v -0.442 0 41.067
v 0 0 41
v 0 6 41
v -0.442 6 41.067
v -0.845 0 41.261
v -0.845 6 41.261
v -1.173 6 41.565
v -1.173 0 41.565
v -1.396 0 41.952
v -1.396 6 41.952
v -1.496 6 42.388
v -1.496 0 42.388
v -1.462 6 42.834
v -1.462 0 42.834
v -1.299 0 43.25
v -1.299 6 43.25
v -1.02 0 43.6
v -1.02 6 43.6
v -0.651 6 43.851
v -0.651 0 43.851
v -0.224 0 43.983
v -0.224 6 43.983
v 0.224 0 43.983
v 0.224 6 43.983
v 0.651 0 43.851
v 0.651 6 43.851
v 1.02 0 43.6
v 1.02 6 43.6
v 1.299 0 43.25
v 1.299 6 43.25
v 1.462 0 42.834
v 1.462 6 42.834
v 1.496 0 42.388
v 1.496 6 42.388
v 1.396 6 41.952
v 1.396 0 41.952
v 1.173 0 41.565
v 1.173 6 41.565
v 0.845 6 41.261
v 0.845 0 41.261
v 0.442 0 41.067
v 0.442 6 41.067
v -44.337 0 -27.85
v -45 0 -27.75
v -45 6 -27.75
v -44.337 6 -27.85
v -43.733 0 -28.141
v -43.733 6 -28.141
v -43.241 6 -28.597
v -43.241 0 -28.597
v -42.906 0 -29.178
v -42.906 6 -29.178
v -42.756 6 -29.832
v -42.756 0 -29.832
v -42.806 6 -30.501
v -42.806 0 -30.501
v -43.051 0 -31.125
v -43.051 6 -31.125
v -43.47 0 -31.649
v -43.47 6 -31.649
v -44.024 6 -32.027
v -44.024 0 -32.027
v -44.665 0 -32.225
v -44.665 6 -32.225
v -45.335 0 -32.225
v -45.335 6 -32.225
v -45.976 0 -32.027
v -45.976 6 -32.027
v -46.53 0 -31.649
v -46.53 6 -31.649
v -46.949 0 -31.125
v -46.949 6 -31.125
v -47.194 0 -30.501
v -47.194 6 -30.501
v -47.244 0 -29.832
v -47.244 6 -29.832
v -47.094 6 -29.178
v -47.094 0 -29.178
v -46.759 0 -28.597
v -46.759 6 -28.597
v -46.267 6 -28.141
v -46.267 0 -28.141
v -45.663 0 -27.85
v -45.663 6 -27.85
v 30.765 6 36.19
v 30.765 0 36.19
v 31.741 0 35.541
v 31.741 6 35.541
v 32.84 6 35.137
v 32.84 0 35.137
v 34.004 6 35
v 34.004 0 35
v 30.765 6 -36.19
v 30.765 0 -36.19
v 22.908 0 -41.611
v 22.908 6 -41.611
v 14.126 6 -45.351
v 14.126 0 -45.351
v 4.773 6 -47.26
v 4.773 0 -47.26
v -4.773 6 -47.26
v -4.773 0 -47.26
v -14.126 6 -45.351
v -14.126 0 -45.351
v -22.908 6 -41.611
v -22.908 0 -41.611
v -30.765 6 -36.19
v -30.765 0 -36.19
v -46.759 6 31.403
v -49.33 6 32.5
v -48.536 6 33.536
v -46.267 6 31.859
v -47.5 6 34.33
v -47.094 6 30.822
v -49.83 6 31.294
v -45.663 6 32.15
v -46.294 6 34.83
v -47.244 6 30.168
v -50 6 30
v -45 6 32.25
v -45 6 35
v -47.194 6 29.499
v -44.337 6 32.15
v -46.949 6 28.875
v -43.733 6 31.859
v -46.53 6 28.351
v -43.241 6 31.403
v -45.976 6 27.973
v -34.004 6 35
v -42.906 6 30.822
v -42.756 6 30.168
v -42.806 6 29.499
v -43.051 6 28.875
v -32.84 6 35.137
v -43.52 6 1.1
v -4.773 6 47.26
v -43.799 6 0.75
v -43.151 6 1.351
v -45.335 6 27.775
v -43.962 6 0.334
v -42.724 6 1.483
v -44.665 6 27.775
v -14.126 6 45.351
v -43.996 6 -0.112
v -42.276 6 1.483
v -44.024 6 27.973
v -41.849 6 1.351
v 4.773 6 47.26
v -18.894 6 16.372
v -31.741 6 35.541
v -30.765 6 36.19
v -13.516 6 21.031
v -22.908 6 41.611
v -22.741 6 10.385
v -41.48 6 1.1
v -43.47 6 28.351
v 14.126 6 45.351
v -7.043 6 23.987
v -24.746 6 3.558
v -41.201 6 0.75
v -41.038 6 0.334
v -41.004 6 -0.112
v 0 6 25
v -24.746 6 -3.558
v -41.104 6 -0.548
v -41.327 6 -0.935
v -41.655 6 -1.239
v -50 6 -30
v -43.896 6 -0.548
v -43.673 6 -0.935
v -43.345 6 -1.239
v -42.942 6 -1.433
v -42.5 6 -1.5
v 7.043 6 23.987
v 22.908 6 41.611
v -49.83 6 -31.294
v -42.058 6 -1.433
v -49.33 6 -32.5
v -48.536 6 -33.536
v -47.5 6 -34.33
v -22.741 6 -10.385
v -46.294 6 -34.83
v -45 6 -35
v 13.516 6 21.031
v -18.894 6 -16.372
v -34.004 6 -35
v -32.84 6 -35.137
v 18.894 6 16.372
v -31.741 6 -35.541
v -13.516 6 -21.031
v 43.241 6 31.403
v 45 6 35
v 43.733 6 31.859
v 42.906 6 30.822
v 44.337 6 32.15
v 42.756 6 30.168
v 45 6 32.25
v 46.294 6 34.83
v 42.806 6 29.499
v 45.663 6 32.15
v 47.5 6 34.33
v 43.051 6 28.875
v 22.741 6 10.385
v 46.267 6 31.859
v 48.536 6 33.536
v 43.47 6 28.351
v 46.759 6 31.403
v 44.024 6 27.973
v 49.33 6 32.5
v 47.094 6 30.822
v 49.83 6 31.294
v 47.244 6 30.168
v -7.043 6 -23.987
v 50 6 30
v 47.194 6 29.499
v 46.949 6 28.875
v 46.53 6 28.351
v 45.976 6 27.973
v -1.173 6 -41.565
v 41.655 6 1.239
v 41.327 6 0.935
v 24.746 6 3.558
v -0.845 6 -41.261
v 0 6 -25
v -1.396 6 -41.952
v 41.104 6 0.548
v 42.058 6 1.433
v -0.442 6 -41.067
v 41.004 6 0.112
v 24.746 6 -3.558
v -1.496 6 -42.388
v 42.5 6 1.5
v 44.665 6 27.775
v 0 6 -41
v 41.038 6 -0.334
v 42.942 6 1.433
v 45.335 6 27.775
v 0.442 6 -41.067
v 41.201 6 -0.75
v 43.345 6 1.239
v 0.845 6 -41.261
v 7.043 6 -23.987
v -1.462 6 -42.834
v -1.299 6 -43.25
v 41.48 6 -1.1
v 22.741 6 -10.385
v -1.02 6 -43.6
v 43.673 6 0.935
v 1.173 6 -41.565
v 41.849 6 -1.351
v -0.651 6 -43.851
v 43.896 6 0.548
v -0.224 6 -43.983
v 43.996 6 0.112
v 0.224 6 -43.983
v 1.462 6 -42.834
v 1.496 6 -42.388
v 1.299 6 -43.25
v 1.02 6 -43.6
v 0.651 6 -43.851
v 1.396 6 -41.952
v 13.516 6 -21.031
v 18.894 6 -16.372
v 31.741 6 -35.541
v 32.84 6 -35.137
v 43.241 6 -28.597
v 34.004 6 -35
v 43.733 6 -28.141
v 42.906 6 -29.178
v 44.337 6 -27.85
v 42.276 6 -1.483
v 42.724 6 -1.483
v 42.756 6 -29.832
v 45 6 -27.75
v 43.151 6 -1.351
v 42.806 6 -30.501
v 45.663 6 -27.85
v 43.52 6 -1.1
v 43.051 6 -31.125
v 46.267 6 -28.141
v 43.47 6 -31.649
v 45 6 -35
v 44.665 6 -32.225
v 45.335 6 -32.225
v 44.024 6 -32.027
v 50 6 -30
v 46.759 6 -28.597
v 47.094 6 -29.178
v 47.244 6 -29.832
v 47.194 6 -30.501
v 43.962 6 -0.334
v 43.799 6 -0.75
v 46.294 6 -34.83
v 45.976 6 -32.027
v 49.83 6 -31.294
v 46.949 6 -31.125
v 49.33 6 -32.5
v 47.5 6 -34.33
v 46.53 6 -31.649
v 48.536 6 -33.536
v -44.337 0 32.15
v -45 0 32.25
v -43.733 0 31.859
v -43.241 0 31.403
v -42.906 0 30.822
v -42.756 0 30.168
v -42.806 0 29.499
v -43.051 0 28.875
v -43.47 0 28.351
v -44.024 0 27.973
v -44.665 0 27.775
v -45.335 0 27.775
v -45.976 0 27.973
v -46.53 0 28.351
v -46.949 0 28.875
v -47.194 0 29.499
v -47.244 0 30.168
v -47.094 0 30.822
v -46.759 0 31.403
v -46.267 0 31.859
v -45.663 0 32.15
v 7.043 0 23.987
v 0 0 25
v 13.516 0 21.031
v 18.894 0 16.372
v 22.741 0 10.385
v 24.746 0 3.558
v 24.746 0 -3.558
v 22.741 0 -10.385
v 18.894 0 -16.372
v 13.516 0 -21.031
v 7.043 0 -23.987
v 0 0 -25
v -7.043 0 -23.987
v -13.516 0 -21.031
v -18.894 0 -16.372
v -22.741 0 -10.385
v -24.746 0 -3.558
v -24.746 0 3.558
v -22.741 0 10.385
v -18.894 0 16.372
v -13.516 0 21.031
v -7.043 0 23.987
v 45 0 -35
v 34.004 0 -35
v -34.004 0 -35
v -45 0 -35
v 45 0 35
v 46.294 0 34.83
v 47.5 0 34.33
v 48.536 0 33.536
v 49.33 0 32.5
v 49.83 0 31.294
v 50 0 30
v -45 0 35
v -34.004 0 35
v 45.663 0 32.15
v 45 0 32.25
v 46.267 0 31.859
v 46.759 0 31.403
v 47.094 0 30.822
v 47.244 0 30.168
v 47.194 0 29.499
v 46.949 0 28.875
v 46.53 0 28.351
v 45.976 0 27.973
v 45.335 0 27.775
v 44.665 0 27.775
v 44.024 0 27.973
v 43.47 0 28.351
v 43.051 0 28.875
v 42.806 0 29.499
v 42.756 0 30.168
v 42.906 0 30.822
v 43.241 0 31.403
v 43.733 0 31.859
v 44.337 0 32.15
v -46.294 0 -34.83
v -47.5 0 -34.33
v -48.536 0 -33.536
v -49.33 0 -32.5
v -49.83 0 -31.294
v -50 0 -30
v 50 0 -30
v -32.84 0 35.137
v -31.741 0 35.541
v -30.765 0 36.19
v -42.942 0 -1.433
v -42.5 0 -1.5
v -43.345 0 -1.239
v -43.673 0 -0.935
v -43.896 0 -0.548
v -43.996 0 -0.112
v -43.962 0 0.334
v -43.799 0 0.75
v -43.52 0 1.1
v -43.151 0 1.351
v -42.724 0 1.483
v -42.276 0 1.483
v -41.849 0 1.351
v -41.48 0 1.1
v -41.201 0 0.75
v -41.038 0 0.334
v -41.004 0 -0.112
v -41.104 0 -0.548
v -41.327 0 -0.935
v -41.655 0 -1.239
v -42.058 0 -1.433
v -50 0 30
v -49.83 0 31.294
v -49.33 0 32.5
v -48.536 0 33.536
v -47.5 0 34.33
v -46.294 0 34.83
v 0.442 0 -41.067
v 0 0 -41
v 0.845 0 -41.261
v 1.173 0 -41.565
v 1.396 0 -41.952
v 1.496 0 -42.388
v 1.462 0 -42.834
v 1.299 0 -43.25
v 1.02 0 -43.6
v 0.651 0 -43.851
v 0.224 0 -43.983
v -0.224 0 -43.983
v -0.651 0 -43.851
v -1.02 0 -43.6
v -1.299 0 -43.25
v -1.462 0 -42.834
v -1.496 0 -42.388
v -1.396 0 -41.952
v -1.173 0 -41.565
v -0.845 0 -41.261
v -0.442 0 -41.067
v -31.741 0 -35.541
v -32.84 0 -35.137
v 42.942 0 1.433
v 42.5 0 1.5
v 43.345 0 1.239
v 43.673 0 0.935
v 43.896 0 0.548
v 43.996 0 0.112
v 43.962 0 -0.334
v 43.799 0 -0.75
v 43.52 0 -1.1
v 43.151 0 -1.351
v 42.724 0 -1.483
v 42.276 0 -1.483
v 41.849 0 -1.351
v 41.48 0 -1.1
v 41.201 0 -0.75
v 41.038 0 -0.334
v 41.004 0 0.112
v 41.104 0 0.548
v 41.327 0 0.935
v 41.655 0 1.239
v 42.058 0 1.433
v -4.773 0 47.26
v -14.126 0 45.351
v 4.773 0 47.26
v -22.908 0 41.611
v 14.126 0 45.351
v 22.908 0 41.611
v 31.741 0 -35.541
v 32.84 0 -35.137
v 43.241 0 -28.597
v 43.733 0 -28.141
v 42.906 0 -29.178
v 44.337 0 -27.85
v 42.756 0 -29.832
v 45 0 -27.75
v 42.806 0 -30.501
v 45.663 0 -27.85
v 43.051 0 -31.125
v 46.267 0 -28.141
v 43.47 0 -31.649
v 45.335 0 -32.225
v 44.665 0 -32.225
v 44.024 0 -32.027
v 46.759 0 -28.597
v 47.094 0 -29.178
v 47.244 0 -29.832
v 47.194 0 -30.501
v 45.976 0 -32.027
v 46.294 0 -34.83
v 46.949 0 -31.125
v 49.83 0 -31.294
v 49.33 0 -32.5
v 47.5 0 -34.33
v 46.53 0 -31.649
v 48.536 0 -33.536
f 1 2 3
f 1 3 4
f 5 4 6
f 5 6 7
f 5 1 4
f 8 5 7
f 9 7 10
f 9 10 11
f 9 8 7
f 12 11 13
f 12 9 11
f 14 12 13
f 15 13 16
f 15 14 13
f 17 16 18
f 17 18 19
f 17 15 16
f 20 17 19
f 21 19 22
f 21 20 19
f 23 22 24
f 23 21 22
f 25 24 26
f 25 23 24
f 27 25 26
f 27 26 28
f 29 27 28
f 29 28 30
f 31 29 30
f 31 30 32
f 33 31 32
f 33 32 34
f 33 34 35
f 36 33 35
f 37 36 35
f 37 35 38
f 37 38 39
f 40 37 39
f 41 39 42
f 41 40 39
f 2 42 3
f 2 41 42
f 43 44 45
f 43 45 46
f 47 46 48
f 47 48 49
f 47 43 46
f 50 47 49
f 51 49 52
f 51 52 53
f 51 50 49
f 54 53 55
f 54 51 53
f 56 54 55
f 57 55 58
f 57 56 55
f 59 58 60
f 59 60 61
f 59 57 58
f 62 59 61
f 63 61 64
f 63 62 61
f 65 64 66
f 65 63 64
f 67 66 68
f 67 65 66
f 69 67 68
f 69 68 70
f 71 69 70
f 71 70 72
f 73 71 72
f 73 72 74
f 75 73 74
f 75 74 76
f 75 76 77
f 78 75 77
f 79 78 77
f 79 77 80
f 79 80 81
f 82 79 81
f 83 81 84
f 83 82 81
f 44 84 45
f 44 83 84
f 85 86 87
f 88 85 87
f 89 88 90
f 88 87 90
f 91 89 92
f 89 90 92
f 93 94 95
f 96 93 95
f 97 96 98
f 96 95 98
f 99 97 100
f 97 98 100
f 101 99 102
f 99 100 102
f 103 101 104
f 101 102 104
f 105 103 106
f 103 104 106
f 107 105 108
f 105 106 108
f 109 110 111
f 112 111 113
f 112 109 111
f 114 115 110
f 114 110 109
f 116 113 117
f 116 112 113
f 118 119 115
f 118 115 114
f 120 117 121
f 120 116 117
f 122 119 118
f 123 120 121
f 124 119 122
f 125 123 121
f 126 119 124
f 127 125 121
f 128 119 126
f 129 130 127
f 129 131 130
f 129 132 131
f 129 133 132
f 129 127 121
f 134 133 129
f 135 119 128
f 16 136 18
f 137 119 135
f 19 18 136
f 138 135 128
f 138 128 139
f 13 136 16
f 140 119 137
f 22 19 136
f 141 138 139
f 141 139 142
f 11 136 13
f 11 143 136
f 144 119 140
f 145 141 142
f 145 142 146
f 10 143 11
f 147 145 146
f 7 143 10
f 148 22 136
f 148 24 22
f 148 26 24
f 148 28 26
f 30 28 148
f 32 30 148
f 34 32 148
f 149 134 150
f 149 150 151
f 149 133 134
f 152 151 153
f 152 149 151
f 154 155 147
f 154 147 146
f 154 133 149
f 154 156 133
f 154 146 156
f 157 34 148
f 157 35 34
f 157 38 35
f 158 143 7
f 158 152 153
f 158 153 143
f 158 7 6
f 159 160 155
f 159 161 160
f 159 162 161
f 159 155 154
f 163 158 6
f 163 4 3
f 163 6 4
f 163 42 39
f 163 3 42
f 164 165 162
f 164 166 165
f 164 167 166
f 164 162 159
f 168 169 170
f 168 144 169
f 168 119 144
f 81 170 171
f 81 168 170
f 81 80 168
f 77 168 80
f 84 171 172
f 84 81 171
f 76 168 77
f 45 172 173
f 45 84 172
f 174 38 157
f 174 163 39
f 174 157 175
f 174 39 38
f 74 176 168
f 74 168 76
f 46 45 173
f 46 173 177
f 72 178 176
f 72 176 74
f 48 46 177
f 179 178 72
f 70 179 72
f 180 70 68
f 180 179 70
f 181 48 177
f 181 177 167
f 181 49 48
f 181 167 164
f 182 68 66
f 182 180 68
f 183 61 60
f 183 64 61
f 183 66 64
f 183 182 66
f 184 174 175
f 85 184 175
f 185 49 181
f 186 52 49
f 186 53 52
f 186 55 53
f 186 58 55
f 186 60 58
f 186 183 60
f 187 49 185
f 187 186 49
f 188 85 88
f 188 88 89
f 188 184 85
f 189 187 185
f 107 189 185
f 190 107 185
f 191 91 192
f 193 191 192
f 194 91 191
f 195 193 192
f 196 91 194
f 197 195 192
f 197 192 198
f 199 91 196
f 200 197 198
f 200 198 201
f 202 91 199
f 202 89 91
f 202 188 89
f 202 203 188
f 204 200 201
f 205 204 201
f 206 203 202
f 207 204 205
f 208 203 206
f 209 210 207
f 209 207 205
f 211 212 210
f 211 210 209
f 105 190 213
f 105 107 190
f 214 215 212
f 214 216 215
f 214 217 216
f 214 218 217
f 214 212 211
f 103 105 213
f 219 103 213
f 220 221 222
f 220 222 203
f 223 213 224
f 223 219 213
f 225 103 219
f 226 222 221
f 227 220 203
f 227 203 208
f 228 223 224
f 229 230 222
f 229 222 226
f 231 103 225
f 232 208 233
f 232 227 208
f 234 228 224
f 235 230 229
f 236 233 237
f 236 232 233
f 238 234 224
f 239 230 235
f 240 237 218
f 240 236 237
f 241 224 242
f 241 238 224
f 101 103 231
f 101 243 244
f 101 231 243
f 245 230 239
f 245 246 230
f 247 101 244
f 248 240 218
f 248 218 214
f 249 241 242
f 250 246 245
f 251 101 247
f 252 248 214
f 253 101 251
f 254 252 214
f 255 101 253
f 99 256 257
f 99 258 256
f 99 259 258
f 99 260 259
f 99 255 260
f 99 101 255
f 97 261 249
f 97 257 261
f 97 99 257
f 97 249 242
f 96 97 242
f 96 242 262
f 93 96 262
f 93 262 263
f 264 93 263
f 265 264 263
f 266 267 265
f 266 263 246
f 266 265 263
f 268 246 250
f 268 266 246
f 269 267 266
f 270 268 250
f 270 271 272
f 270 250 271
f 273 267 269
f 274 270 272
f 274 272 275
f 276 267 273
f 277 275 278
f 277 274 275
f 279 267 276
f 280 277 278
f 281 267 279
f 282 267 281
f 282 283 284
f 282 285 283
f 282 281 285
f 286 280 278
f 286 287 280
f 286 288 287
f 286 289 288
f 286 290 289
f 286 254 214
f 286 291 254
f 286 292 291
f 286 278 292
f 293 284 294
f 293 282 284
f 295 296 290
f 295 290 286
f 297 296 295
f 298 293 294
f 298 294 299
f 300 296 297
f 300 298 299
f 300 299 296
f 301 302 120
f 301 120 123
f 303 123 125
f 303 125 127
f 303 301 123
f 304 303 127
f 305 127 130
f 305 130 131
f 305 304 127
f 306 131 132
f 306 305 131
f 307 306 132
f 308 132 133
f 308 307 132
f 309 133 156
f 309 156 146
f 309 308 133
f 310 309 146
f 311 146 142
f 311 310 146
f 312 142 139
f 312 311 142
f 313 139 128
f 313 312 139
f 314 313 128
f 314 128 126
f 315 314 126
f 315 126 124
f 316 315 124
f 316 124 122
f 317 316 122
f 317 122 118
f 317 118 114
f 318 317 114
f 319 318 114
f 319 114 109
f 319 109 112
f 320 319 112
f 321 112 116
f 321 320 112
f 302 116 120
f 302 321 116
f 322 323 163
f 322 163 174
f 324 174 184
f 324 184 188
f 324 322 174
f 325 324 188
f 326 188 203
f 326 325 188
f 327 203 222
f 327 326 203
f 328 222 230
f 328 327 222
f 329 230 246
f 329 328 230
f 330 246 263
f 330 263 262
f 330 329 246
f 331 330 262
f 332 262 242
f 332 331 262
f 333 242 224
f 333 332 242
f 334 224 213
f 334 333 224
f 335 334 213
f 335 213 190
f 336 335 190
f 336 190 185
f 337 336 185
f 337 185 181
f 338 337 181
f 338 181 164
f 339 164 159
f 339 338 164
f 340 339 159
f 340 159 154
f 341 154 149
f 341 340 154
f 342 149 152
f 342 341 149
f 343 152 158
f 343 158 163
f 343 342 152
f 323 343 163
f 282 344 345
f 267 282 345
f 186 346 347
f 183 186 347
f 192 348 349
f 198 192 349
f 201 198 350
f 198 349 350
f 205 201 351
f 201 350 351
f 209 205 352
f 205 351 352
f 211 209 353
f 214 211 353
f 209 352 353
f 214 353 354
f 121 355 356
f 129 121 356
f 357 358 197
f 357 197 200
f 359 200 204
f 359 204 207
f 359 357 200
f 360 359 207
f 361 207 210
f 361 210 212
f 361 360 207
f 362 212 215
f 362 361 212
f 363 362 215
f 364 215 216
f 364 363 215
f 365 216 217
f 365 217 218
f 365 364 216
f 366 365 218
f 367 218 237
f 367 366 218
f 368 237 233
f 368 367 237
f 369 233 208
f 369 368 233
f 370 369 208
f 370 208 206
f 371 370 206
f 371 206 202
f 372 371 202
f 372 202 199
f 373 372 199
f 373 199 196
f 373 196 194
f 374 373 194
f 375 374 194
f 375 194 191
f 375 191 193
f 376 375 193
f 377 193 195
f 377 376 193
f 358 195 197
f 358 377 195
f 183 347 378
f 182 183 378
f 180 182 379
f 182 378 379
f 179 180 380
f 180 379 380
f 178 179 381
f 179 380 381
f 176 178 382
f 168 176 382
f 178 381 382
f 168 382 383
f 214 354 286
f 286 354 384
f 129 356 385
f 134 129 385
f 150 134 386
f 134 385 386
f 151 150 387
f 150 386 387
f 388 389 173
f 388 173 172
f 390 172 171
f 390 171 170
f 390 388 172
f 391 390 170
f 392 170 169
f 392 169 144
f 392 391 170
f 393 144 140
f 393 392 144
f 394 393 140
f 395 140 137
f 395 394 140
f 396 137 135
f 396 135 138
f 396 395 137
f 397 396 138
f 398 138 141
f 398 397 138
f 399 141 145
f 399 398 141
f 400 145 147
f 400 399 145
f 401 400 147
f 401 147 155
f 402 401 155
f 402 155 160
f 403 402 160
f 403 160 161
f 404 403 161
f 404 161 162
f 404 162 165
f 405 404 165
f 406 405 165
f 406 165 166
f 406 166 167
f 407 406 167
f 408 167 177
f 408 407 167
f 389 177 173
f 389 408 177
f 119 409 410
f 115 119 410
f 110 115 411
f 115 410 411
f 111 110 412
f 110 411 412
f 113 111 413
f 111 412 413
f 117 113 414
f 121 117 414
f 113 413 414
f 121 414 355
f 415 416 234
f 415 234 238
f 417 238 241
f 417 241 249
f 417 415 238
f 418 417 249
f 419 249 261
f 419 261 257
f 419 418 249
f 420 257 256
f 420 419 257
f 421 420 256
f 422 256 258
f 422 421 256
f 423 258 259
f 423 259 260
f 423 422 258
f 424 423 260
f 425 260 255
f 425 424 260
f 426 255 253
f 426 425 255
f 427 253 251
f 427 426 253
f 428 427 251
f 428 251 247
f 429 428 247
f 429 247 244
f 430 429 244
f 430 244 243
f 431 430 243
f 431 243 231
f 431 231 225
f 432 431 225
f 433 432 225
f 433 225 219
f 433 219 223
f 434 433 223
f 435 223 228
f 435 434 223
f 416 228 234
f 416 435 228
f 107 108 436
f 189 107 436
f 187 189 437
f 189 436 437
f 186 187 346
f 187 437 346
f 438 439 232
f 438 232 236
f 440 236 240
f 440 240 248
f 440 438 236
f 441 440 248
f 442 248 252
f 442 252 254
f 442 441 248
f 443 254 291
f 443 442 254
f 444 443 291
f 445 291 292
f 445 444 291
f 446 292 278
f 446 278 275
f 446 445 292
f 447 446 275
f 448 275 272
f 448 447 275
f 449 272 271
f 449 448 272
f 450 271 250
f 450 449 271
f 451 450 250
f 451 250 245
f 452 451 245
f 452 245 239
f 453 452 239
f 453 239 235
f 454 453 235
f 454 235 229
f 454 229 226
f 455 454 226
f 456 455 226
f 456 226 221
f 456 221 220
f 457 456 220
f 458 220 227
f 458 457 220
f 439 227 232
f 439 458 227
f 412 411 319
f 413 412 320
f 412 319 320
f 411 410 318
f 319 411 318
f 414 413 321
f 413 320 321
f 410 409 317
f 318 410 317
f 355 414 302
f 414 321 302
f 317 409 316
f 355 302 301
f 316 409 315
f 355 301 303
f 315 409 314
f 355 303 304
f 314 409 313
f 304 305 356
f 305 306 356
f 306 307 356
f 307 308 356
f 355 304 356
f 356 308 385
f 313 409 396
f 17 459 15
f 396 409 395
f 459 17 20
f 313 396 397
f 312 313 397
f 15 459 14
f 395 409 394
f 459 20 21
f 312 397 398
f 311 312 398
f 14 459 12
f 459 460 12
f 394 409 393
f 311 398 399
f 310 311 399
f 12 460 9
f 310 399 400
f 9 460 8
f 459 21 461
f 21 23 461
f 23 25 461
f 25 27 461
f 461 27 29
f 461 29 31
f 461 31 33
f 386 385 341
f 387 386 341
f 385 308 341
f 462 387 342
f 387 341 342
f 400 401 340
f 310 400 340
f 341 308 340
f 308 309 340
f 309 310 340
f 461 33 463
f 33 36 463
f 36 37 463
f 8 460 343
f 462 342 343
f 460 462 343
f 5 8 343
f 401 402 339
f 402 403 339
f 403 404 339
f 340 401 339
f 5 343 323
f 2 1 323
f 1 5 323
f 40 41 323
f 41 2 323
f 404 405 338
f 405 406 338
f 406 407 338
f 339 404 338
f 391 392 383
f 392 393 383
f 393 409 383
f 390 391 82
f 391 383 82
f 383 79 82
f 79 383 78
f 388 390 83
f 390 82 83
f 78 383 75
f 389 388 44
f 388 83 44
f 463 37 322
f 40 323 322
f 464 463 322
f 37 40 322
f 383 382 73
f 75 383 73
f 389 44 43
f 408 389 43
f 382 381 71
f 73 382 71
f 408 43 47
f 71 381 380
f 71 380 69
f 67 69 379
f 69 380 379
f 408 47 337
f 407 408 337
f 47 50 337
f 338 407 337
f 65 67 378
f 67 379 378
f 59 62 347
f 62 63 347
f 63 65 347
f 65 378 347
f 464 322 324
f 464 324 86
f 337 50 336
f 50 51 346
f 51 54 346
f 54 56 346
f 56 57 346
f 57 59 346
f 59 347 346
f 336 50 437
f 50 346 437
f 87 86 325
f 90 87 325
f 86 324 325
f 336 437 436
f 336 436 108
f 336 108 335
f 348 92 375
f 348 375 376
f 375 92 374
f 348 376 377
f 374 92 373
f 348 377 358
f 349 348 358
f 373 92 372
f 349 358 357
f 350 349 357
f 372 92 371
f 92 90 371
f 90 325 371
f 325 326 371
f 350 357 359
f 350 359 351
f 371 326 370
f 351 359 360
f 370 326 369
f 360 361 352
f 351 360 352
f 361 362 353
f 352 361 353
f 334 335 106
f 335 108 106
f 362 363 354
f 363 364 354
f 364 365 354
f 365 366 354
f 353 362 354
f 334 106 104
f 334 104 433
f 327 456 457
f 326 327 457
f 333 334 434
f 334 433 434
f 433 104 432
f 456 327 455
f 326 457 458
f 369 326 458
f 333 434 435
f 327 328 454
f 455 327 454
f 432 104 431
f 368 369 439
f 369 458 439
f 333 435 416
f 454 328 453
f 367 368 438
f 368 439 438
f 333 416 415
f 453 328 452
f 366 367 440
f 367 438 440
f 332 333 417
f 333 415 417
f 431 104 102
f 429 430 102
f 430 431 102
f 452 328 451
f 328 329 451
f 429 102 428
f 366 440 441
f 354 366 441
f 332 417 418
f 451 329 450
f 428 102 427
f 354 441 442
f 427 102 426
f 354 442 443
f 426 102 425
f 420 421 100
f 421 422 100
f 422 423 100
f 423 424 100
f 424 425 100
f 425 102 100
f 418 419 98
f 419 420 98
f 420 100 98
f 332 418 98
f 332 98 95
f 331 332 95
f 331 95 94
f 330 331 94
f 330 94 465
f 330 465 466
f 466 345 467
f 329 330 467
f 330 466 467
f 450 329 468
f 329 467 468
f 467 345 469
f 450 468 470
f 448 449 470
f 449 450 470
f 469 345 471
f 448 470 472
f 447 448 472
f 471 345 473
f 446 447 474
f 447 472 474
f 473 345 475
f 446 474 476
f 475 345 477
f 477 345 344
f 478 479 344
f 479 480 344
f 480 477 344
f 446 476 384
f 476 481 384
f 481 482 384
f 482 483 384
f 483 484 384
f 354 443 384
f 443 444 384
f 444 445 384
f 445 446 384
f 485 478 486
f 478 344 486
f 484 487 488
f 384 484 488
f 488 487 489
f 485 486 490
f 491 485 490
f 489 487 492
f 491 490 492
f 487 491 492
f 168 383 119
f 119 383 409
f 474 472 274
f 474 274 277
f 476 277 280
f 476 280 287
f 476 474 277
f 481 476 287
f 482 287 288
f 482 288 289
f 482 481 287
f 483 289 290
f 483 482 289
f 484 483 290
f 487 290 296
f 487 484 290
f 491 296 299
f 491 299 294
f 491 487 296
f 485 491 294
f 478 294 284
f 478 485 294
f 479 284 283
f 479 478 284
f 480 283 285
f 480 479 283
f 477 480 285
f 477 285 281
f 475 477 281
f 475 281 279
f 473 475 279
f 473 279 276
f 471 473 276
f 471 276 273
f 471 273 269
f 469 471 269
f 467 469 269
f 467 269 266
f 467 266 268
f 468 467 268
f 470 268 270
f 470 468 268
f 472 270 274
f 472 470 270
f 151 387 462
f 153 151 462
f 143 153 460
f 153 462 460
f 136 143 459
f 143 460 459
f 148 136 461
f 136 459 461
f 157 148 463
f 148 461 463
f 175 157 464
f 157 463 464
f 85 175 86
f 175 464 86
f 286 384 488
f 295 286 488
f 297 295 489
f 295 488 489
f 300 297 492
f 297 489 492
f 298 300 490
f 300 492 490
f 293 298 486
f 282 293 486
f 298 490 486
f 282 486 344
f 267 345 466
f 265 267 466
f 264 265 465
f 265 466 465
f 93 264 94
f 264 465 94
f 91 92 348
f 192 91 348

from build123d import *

# Parameters (mm, degrees)
SKETCH1_R           = 2.25
SKETCH1_R_2         = 25
SKETCH1_R_3         = 1.5
BOSS_EXTRUDE1_DEPTH = 6


with BuildPart() as part:
    # Sketch1 → Boss-Extrude1 (new body)
    with BuildSketch(Plane(origin=(0, 0, 0), x_dir=(1, 0, 0), z_dir=(0, 1, 0))):
        with BuildLine():
            Line((50, -30), (50, 30))
            ThreePointArc((50, 30), (48.535533906, 33.535533906), (45, 35))
            Line((45, 35), (34.003676272, 35))
            ThreePointArc((34.003676272, 35), (32.278512373, 35.307046823), (30.765230913, 36.19047619))
            ThreePointArc((30.765230913, 36.19047619), (0, 47.5), (-30.765230913, 36.19047619))
            ThreePointArc((-30.765230913, 36.19047619), (-32.278512373, 35.307046823), (-34.003676272, 35))
            Line((-34.003676272, 35), (-45, 35))
            ThreePointArc((-45, 35), (-48.535533906, 33.535533906), (-50, 30))
            Line((-50, 30), (-50, -30))
            ThreePointArc((-50, -30), (-48.535533906, -33.535533906), (-45, -35))
            Line((-45, -35), (-34.003676272, -35))
            ThreePointArc((-34.003676272, -35), (-32.278512373, -35.307046823), (-30.765230913, -36.19047619))
            ThreePointArc((-30.765230913, -36.19047619), (0, -47.5), (30.765230913, -36.19047619))
            ThreePointArc((30.765230913, -36.19047619), (32.278512373, -35.307046823), (34.003676272, -35))
            Line((34.003676272, -35), (45, -35))
            ThreePointArc((45, -35), (48.535533906, -33.535533906), (50, -30))
        make_face()
        with Locations(Location((-45, 30, 0), (0, 0, 270))):
            Circle(SKETCH1_R, mode=Mode.SUBTRACT)
        with Locations(Location((-45, -30, 0), (0, 0, 270))):
            Circle(SKETCH1_R, mode=Mode.SUBTRACT)
        with Locations(Location((45, -30, 0), (0, 0, 270))):
            Circle(SKETCH1_R, mode=Mode.SUBTRACT)
        with Locations(Location((45, 30, 0), (0, 0, 270))):
            Circle(SKETCH1_R, mode=Mode.SUBTRACT)
        with Locations(Location((0, 0, 0), (0, 0, 270))):
            Circle(SKETCH1_R_2, mode=Mode.SUBTRACT)
        with Locations(Location((0, 42.5, 0), (0, 0, 270))):
            Circle(SKETCH1_R_3, mode=Mode.SUBTRACT)
        with Locations(Location((42.5, 0, 0), (0, 0, 270))):
            Circle(SKETCH1_R_3, mode=Mode.SUBTRACT)
        with Locations(Location((0, -42.5, 0), (0, 0, 90))):
            Circle(SKETCH1_R_3, mode=Mode.SUBTRACT)
        with Locations(Location((-42.5, 0, 0), (0, 0, 90))):
            Circle(SKETCH1_R_3, mode=Mode.SUBTRACT)
    extrude(amount=BOSS_EXTRUDE1_DEPTH)


solid = part.part
